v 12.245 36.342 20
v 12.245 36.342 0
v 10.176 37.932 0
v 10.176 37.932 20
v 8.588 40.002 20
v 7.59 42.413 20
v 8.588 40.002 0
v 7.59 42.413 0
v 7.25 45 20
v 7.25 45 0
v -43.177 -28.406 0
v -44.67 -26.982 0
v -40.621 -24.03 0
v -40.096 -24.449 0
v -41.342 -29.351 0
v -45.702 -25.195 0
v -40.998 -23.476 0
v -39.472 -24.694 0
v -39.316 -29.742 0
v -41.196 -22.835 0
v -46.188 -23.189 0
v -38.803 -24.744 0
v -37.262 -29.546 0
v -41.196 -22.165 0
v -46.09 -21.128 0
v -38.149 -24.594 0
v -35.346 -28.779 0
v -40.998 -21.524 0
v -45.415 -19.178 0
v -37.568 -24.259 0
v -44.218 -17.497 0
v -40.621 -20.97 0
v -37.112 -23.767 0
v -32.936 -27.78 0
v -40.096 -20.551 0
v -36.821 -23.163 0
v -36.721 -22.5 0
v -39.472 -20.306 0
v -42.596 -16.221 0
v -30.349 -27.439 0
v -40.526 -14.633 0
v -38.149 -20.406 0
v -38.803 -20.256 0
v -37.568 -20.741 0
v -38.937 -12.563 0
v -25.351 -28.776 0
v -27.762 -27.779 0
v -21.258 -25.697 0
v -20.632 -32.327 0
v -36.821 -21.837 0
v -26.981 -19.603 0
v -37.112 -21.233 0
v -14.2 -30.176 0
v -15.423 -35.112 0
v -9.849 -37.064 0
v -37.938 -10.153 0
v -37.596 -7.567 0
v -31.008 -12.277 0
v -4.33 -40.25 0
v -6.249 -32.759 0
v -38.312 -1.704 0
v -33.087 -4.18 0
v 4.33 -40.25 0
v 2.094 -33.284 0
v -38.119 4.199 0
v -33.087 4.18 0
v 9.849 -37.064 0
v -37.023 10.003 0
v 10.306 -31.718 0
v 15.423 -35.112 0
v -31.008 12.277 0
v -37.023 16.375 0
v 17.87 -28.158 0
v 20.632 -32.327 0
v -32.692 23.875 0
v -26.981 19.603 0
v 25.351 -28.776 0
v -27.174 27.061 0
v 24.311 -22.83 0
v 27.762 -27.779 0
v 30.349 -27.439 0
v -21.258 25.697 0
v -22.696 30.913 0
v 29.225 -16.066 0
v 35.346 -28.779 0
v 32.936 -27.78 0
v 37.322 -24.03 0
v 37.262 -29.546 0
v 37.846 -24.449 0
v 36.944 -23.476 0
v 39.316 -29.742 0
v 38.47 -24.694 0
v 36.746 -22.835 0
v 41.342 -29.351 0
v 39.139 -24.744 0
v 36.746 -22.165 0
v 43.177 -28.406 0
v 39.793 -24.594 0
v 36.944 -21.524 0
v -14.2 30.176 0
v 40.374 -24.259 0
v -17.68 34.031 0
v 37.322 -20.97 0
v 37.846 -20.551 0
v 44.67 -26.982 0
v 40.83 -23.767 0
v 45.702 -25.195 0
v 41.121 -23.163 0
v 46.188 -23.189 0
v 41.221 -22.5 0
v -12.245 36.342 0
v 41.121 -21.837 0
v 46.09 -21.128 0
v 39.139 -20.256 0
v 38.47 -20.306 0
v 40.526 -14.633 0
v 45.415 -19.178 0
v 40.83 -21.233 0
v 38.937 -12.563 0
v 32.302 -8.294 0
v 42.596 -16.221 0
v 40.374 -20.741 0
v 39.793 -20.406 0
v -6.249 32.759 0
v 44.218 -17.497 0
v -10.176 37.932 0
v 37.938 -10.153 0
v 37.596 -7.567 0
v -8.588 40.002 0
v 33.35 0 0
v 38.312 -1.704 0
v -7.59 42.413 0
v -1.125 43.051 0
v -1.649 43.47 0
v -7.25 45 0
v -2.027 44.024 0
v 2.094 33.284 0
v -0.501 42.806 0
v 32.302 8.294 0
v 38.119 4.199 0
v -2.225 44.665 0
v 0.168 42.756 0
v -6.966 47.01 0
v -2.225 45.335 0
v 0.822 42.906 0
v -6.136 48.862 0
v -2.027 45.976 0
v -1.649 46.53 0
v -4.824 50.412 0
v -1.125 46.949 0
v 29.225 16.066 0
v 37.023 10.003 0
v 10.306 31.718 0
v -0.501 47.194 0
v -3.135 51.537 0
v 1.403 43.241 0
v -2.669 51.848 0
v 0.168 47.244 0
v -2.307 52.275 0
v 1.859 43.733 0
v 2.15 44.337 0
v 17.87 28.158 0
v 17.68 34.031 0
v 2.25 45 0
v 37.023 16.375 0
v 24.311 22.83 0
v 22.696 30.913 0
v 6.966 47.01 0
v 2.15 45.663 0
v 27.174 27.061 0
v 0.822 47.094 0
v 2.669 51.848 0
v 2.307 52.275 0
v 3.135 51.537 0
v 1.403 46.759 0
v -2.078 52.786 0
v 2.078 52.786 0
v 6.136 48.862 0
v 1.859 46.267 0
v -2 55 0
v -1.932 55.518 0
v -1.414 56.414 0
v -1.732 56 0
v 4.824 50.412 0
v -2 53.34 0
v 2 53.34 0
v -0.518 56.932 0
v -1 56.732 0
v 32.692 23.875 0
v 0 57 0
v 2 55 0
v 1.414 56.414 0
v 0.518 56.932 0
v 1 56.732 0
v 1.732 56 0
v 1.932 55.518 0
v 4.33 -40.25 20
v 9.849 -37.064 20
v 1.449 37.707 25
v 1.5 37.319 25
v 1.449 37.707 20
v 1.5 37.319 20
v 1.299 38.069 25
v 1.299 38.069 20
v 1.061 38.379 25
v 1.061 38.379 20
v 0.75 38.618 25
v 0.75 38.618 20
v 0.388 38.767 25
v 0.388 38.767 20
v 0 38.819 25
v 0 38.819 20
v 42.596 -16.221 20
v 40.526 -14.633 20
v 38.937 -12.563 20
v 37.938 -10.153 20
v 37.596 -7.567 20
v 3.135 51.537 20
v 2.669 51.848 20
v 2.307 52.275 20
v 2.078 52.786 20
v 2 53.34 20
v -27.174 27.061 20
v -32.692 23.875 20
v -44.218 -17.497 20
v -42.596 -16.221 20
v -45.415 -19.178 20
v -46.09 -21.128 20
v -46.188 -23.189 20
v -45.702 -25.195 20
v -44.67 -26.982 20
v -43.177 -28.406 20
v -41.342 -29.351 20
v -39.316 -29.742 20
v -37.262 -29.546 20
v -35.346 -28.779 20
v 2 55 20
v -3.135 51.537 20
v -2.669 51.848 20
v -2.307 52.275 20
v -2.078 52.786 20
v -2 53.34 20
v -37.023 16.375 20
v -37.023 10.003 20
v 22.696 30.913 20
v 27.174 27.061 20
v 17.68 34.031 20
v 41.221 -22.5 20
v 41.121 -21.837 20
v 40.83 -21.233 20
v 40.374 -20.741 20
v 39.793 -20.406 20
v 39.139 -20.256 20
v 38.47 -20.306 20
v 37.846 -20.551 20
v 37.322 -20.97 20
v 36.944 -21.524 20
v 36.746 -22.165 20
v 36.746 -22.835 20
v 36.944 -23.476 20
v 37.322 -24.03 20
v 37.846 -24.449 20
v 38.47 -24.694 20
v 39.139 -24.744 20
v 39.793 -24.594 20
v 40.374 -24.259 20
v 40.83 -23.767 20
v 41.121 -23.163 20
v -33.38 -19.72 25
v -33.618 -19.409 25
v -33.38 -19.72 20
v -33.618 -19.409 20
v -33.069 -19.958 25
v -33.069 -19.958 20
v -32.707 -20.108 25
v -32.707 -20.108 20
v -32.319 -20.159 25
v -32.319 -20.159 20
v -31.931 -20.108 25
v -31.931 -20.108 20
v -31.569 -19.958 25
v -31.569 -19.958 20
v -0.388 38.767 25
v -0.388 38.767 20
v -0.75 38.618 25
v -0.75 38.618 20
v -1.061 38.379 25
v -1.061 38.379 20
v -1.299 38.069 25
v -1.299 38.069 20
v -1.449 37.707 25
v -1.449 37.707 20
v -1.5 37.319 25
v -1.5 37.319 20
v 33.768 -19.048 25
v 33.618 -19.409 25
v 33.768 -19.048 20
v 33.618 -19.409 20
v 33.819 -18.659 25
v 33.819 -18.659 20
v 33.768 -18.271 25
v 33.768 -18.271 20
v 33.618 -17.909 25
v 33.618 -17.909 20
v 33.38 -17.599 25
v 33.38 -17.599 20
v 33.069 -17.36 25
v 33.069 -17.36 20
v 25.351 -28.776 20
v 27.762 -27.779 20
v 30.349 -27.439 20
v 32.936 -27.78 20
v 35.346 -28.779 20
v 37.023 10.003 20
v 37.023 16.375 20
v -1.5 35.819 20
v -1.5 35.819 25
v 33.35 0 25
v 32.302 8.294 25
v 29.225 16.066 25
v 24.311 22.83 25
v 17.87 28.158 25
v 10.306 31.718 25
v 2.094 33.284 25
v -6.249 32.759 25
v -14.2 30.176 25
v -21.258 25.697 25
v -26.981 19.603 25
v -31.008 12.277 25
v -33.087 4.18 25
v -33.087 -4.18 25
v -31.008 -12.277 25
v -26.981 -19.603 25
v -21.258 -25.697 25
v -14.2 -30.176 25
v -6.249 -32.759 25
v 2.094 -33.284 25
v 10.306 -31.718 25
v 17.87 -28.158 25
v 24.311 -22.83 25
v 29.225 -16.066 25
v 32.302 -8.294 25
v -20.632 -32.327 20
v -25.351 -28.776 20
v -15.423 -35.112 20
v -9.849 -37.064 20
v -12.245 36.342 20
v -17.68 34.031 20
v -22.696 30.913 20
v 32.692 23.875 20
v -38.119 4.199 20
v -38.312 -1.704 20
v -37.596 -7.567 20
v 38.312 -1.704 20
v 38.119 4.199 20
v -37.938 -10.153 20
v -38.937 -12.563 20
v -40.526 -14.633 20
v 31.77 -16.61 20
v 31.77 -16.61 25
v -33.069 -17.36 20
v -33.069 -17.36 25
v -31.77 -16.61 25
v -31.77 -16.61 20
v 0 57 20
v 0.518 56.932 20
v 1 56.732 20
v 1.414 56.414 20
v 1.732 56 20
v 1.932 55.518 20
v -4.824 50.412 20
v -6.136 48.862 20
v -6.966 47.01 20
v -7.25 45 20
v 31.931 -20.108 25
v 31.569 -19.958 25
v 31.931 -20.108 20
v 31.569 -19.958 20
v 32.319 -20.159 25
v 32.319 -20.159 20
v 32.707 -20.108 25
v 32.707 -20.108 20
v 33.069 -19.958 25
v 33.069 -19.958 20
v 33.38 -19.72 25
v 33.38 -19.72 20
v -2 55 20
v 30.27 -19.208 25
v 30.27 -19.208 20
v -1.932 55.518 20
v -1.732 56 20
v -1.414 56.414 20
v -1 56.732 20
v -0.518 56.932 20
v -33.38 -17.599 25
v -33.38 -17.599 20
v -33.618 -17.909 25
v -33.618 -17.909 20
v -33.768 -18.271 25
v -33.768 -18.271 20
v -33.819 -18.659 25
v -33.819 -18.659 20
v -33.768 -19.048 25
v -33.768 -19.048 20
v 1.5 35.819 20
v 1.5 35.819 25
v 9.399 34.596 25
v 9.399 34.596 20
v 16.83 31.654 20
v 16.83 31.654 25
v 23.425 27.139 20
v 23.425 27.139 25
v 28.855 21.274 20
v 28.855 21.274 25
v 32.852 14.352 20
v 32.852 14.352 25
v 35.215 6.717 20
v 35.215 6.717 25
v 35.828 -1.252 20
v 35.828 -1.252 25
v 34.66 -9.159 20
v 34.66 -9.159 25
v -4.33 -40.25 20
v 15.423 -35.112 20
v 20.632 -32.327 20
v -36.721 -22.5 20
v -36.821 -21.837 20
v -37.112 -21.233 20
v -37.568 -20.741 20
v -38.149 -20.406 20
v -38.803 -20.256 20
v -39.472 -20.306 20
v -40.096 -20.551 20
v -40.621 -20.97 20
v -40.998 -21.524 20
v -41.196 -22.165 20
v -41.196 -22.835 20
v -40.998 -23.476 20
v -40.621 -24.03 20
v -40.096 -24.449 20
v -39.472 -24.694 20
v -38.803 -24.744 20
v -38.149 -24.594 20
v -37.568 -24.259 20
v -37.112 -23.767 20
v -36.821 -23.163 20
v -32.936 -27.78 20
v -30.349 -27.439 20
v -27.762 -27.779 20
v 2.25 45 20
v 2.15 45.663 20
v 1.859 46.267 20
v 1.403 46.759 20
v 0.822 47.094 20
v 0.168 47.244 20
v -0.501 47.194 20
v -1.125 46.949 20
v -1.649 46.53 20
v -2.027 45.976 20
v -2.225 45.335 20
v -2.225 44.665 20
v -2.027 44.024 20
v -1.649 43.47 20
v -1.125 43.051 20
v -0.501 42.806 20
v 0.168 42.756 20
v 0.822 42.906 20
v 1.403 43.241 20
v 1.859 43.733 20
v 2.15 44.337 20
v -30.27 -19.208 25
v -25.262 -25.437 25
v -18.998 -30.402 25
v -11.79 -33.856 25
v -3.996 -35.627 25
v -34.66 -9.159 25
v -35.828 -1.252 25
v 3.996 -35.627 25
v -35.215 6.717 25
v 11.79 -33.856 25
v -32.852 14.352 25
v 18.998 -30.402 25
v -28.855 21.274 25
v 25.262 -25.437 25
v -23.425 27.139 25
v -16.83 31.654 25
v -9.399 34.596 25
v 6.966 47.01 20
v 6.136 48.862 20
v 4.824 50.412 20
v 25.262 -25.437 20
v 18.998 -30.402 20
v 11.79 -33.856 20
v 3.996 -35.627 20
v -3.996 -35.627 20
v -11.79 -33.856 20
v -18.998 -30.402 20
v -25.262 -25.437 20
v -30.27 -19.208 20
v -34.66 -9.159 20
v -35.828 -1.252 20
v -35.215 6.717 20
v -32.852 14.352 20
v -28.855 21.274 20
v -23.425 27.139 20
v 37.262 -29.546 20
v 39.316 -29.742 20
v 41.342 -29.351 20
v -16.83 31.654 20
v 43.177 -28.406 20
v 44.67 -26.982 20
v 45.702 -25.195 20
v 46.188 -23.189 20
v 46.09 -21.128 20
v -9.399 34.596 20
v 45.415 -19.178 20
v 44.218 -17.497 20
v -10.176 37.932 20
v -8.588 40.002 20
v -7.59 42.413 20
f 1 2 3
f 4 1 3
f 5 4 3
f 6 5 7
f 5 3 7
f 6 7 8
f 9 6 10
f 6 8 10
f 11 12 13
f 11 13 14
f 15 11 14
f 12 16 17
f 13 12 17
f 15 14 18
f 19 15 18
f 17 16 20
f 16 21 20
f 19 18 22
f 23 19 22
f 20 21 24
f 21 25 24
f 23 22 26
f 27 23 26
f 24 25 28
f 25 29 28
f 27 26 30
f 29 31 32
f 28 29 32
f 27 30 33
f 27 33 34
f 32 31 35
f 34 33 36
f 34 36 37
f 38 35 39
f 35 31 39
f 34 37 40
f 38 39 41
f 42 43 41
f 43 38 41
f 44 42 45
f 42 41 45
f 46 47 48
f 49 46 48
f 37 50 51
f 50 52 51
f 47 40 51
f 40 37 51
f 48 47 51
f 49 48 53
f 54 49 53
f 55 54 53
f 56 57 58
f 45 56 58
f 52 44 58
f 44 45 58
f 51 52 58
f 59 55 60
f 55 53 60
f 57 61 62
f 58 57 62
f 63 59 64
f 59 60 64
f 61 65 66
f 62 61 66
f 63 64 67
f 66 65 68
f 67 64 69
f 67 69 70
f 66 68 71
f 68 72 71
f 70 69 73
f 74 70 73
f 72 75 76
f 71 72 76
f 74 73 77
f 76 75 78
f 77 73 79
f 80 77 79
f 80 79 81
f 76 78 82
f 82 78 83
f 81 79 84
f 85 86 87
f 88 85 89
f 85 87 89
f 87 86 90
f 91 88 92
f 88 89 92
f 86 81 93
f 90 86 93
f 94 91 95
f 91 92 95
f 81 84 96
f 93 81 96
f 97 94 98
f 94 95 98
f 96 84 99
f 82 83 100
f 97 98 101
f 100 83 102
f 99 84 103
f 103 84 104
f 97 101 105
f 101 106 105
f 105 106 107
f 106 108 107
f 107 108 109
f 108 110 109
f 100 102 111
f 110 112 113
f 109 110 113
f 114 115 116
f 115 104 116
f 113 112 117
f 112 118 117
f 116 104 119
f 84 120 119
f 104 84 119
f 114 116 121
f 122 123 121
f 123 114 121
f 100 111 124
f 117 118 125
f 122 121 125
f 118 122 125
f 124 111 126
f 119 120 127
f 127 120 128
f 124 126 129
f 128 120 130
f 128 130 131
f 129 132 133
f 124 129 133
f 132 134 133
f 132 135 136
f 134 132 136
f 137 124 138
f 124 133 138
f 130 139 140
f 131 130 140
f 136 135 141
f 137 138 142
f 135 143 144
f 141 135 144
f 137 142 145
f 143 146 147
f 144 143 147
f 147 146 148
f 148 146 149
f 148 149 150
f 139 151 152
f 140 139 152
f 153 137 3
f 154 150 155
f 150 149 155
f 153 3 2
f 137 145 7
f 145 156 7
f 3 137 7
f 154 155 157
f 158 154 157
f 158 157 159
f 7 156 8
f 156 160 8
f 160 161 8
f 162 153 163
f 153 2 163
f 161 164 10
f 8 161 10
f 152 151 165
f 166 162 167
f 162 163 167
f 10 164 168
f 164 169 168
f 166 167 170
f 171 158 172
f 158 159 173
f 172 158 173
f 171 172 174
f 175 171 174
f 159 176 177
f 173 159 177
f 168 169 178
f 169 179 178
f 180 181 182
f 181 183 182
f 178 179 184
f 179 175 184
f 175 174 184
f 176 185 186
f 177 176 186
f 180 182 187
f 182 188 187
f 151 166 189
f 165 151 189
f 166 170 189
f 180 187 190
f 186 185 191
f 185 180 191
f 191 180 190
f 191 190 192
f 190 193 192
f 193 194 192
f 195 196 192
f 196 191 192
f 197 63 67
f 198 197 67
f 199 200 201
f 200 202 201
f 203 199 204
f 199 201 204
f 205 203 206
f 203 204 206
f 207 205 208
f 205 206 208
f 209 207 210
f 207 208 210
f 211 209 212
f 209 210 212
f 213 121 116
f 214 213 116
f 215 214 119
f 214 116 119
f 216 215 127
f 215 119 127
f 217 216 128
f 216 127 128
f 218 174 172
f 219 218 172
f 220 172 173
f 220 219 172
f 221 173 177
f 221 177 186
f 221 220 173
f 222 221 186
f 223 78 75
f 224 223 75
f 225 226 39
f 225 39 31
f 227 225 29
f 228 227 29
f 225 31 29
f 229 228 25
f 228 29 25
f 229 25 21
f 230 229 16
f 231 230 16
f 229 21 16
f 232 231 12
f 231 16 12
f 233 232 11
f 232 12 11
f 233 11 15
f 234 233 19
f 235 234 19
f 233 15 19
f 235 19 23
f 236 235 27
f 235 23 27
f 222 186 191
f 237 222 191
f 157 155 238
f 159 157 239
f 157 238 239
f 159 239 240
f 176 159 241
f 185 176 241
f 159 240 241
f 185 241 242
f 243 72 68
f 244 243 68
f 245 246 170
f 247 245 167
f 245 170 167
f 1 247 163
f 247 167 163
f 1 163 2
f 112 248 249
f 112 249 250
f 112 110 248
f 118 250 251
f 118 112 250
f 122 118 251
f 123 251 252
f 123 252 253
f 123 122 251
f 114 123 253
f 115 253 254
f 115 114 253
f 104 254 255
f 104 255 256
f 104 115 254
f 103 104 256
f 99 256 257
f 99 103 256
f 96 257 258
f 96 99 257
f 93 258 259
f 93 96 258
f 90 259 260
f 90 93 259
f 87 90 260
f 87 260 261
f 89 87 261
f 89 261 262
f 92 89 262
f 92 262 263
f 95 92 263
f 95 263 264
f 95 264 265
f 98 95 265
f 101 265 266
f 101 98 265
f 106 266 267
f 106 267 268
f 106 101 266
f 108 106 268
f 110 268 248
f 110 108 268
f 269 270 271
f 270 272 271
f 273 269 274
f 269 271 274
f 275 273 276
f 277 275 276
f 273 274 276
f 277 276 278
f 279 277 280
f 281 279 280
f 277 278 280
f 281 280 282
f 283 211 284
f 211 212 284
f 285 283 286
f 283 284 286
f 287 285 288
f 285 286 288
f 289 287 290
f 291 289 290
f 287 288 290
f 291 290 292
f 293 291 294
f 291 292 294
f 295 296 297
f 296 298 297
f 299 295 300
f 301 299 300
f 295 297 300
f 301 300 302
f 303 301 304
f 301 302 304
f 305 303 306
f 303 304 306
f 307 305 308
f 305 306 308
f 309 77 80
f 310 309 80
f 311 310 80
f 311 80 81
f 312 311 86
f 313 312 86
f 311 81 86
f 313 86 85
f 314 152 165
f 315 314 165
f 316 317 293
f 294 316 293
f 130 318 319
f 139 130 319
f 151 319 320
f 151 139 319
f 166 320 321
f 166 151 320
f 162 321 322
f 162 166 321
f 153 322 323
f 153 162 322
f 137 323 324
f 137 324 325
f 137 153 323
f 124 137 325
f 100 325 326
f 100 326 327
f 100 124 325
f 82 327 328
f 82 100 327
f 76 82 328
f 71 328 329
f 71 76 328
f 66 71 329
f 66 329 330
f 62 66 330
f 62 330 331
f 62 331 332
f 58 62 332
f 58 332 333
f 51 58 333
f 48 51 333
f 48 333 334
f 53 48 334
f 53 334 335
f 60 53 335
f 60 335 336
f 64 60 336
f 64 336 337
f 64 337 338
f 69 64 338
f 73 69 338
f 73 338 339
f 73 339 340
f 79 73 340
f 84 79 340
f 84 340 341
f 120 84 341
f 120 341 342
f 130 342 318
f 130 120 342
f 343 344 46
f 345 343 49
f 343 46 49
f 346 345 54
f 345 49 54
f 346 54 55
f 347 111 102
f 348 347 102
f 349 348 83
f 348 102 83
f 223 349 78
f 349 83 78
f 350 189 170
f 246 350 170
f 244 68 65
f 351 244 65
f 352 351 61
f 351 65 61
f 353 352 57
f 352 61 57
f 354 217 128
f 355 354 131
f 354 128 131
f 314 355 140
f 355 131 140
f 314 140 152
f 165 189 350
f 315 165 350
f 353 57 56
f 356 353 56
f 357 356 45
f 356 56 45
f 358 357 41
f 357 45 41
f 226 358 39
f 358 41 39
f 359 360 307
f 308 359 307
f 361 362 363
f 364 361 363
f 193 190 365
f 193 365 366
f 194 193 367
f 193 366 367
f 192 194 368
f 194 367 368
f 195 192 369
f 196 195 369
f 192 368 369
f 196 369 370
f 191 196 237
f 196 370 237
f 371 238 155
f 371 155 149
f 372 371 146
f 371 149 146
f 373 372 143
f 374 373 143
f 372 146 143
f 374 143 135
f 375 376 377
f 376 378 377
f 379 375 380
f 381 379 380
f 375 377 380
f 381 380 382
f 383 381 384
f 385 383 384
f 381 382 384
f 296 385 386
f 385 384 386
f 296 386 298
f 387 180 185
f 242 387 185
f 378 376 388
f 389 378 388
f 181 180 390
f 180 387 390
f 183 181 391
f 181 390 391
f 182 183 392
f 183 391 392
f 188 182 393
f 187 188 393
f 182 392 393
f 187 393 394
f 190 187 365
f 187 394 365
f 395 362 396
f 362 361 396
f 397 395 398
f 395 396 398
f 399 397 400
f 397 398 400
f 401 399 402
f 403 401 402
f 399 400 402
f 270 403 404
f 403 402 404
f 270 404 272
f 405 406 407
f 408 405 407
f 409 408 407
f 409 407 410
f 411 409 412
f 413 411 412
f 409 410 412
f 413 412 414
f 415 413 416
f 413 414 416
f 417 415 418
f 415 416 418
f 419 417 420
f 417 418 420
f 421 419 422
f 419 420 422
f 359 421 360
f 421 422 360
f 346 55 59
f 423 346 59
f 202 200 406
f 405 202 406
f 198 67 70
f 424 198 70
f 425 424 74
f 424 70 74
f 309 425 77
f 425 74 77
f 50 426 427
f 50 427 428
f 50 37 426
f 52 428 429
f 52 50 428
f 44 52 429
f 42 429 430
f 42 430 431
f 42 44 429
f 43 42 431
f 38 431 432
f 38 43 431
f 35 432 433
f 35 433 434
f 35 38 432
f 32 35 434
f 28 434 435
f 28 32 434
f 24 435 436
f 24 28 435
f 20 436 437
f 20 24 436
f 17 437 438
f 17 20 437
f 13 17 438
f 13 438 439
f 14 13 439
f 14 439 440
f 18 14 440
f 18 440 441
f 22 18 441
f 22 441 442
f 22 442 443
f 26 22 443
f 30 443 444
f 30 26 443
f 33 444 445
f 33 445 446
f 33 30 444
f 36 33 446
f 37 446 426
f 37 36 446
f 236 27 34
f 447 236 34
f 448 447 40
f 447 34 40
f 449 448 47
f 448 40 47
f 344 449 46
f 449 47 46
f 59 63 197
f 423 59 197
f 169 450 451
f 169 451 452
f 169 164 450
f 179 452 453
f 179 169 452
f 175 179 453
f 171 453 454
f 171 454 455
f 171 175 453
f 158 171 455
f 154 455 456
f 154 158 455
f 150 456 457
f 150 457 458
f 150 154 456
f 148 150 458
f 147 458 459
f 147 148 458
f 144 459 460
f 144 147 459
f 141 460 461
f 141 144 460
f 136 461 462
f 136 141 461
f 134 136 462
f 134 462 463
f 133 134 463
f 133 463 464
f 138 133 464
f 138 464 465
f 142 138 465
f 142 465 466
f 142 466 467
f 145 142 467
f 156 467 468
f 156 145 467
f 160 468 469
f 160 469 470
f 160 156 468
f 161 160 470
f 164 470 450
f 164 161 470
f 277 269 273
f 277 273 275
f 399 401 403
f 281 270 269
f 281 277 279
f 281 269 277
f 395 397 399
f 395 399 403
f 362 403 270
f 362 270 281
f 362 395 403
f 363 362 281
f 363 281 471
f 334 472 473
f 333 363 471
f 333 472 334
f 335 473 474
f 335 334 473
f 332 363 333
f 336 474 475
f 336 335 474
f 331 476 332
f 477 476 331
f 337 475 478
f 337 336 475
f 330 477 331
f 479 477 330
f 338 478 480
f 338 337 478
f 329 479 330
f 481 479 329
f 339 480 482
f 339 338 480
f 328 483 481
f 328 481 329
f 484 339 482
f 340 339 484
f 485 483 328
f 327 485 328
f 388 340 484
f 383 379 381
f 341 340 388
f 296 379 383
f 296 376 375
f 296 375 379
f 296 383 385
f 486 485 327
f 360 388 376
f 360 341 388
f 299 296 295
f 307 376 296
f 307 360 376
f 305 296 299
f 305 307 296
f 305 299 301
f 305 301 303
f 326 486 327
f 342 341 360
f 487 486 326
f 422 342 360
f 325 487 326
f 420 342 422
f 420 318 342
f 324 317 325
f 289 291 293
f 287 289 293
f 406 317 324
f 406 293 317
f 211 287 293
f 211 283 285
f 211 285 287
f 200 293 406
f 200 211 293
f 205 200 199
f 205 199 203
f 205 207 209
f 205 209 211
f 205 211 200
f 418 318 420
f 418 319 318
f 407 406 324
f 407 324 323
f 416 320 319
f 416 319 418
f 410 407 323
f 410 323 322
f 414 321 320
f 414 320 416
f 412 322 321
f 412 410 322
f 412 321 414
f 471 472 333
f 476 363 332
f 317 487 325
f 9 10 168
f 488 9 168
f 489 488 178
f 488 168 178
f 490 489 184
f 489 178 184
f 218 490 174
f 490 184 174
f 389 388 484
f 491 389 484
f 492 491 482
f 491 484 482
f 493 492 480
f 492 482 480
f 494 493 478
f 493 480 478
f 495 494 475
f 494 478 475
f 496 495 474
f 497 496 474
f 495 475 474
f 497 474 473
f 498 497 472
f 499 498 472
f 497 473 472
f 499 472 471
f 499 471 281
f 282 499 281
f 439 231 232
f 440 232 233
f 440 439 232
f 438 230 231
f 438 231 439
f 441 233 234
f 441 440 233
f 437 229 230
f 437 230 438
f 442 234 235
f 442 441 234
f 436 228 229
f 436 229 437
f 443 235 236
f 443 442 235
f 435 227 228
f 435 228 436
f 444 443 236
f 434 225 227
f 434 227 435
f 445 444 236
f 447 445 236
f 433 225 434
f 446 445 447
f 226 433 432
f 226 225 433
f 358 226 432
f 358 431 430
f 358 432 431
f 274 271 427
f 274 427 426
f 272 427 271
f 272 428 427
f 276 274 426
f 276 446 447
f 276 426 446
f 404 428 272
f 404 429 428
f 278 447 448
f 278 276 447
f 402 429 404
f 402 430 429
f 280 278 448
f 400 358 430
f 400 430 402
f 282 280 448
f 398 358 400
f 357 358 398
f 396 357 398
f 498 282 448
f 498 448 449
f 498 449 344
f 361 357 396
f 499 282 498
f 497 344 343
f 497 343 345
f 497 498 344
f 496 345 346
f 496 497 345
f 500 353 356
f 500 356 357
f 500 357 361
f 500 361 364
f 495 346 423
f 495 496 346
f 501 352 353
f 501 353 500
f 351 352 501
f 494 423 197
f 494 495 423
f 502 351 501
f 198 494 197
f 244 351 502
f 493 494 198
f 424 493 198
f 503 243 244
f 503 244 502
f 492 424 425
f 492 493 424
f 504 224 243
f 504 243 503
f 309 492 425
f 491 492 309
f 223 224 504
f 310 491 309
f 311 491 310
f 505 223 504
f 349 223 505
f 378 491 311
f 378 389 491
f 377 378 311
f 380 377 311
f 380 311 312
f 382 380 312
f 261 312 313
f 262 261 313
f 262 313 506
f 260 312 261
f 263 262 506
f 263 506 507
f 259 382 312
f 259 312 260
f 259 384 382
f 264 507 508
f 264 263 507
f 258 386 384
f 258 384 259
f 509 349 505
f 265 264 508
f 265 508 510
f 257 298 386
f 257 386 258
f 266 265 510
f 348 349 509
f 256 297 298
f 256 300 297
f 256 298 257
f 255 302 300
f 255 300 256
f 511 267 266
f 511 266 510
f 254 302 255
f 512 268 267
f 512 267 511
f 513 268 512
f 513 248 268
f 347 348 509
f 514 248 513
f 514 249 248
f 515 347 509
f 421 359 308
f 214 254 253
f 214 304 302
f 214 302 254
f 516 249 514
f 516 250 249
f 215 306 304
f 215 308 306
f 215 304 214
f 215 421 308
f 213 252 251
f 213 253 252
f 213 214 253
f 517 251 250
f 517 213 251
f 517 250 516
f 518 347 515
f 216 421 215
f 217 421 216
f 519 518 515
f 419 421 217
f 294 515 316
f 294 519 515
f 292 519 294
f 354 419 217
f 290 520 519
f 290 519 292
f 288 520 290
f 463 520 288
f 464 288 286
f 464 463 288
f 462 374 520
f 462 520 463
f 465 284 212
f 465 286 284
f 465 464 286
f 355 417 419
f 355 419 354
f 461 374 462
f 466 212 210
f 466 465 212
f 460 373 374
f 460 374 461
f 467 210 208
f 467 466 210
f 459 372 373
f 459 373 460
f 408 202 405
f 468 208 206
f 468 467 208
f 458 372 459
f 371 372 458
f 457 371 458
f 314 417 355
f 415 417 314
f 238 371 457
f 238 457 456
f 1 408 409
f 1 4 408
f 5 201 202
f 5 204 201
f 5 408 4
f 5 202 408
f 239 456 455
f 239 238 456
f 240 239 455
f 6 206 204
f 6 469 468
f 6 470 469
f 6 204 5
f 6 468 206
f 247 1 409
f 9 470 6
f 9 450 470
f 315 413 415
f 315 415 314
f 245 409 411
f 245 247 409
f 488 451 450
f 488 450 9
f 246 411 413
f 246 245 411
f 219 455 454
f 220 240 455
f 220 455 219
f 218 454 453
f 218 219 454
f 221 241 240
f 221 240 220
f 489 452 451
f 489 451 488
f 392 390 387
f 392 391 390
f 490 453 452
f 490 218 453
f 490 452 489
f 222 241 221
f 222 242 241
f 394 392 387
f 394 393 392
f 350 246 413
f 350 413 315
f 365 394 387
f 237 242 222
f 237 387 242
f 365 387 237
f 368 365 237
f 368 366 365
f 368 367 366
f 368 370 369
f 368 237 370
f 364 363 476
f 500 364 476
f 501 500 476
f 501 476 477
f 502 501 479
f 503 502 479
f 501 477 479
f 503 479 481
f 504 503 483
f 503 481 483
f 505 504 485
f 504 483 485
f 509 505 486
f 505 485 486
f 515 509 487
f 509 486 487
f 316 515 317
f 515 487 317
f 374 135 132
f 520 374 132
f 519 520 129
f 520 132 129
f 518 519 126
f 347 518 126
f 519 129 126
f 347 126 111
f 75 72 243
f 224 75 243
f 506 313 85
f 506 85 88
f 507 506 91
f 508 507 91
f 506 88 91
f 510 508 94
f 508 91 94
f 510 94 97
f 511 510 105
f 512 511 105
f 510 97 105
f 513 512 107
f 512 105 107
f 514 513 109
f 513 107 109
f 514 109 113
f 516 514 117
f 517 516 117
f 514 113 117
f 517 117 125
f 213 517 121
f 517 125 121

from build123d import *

# Parameters (mm, degrees)
F0_R     = 2.25
F0_R_2   = 33.35
F1_DEPTH = 20
F2_R     = 33.35
F3_DEPTH = 25
F5_DEPTH = 5
F6_R     = 1.49999
F7_SIZE  = 5
F8_R     = 1.99999


# Not quite as in the source:
# - a fillet or chamfer is up to 0.001 mm smaller than in the source, because OpenCascade refuses the exact size


with BuildPart() as f1:
    # F0 (on Top) → F1 (new body)
    with BuildSketch(Plane.XY):
        with BuildLine():
            ThreePointArc((-35.3461431703, -28.7786841774), (-30.3488782685, -27.4389385893), (-25.3508812473, -28.775950375))
            ThreePointArc((-25.3508812473, -28.775950375), (0, -38.35), (25.3508812473, -28.775950375))
            ThreePointArc((25.3508812473, -28.775950375), (30.3488782685, -27.4389385893), (35.3461431703, -28.7786841774))
            ThreePointArc((35.3461431703, -28.7786841774), (45.2498273477, -26.125), (42.5961431703, -16.2213158226))
            ThreePointArc((42.5961431703, -16.2213158226), (38.9372570055, -12.5634302623), (37.5961446665, -7.566531981))
            ThreePointArc((37.5961446665, -7.566531981), (33.2120742351, 19.175), (12.2452634191, 36.342482356))
            ThreePointArc((12.2452634191, 36.342482356), (8.588378737, 40.0023688516), (7.25, 45))
            ThreePointArc((7.25, 45), (5.790617411, 49.3624820917), (2, 51.9686799324))
            Line((2, 51.9686799324), (2, 54.1277186767))
            Line((2, 54.1277186767), (2, 57))
            Line((2, 57), (0, 57))
            Line((0, 57), (-2, 57))
            Line((-2, 57), (-2, 54.1277186767))
            Line((-2, 54.1277186767), (-2, 51.9686799324))
            ThreePointArc((-2, 51.9686799324), (-5.790617411, 49.3624820917), (-7.25, 45))
            ThreePointArc((-7.25, 45), (-8.588378737, 40.0023688516), (-12.2452634191, 36.342482356))
            ThreePointArc((-12.2452634191, 36.342482356), (-33.2120742351, 19.175), (-37.5961446665, -7.566531981))
            ThreePointArc((-37.5961446665, -7.566531981), (-38.9372570055, -12.5634302623), (-42.5961431703, -16.2213158226))
            ThreePointArc((-42.5961431703, -16.2213158226), (-45.2498273477, -26.125), (-35.3461431703, -28.7786841774))
        make_face()
        with Locations((-38.9711431703, -22.5)):
            Circle(F0_R, mode=Mode.SUBTRACT)
        with Locations((38.9711431703, -22.5)):
            Circle(F0_R, mode=Mode.SUBTRACT)
        Circle(F0_R_2, mode=Mode.SUBTRACT)
        with Locations((0, 45)):
            Circle(F0_R, mode=Mode.SUBTRACT)
    extrude(amount=F1_DEPTH)

    # F2 (on Top) → F3 (join)
    with BuildSketch(Plane.XY):
        Polygon((37.0225860118, -21.375), (37.0225860118, 21.375), (0, 42.75), (-37.0225860118, 21.375), (-37.0225860118, -21.375), (0, -42.75), align=None)
        Circle(F2_R, mode=Mode.SUBTRACT)
    extrude(amount=F3_DEPTH)

    # F4 (on face) → F5 (cut)
    with BuildSketch(Plane.XY.offset(25)):
        Polygon((37.0225860118, -21.375), (37.0225860118, 21.375), (0, 42.75), (-37.0225860118, 21.375), (-37.0225860118, -21.375), (0, -42.75), align=None)
        with BuildLine():
            ThreePointArc((-31.7698222916, -16.6102646446), (-31.0470107257, 17.925), (-1.5, 35.8186055005))
            Line((-1.5, 35.8186055005), (-1.5, 38.8186055005))
            Line((-1.5, 38.8186055005), (0, 38.8186055005))
            Line((0, 38.8186055005), (1.5, 38.8186055005))
            Line((1.5, 38.8186055005), (1.5, 35.8186055005))
            ThreePointArc((1.5, 35.8186055005), (31.0470107257, 17.925), (31.7698222916, -16.6102646446))
            Line((31.7698222916, -16.6102646446), (34.3678985029, -18.1102646446))
            Line((34.3678985029, -18.1102646446), (33.6178985029, -19.4093027502))
            Line((33.6178985029, -19.4093027502), (32.8678985029, -20.7083408559))
            Line((32.8678985029, -20.7083408559), (30.2698222916, -19.2083408559))
            ThreePointArc((30.2698222916, -19.2083408559), (0, -35.85), (-30.2698222916, -19.2083408559))
            Line((-30.2698222916, -19.2083408559), (-32.8678985029, -20.7083408559))
            Line((-32.8678985029, -20.7083408559), (-33.6178985029, -19.4093027502))
            Line((-33.6178985029, -19.4093027502), (-34.3678985029, -18.1102646446))
            Line((-34.3678985029, -18.1102646446), (-31.7698222916, -16.6102646446))
        make_face(mode=Mode.SUBTRACT)
    extrude(amount=-F5_DEPTH, mode=Mode.SUBTRACT)

    # F6 (radius 1.5 in the source; OpenCascade refuses exactly that, so slightly less here)
    f6_edges = [f1.edges().sort_by_distance(p)[0] for p in [
        (-32.867899, -20.708341, 22.5),
        (-34.367899, -18.110265, 22.5),
        (32.867899, -20.708341, 22.5),
        (34.367899, -18.110265, 22.5),
        (1.5, 38.818606, 22.5),
        (-1.5, 38.818606, 22.5),
    ]]
    fillet(f6_edges, radius=F6_R)

    # F7
    f7_edges = [f1.edges().sort_by_distance(p)[0] for p in [
        (0, -42.75, 10),
        (37.022586, 21.375, 10),
        (-37.022586, 21.375, 10),
    ]]
    chamfer(f7_edges, length=F7_SIZE)

    # F8 (radius 2 in the source; OpenCascade refuses exactly that, so slightly less here)
    f8_edges = [f1.edges().sort_by_distance(p)[0] for p in [
        (-2, 57, 10),
        (2, 57, 10),
        (-2, 51.96868, 10),
        (2, 51.96868, 10),
    ]]
    fillet(f8_edges, radius=F8_R)


solid = f1.part
